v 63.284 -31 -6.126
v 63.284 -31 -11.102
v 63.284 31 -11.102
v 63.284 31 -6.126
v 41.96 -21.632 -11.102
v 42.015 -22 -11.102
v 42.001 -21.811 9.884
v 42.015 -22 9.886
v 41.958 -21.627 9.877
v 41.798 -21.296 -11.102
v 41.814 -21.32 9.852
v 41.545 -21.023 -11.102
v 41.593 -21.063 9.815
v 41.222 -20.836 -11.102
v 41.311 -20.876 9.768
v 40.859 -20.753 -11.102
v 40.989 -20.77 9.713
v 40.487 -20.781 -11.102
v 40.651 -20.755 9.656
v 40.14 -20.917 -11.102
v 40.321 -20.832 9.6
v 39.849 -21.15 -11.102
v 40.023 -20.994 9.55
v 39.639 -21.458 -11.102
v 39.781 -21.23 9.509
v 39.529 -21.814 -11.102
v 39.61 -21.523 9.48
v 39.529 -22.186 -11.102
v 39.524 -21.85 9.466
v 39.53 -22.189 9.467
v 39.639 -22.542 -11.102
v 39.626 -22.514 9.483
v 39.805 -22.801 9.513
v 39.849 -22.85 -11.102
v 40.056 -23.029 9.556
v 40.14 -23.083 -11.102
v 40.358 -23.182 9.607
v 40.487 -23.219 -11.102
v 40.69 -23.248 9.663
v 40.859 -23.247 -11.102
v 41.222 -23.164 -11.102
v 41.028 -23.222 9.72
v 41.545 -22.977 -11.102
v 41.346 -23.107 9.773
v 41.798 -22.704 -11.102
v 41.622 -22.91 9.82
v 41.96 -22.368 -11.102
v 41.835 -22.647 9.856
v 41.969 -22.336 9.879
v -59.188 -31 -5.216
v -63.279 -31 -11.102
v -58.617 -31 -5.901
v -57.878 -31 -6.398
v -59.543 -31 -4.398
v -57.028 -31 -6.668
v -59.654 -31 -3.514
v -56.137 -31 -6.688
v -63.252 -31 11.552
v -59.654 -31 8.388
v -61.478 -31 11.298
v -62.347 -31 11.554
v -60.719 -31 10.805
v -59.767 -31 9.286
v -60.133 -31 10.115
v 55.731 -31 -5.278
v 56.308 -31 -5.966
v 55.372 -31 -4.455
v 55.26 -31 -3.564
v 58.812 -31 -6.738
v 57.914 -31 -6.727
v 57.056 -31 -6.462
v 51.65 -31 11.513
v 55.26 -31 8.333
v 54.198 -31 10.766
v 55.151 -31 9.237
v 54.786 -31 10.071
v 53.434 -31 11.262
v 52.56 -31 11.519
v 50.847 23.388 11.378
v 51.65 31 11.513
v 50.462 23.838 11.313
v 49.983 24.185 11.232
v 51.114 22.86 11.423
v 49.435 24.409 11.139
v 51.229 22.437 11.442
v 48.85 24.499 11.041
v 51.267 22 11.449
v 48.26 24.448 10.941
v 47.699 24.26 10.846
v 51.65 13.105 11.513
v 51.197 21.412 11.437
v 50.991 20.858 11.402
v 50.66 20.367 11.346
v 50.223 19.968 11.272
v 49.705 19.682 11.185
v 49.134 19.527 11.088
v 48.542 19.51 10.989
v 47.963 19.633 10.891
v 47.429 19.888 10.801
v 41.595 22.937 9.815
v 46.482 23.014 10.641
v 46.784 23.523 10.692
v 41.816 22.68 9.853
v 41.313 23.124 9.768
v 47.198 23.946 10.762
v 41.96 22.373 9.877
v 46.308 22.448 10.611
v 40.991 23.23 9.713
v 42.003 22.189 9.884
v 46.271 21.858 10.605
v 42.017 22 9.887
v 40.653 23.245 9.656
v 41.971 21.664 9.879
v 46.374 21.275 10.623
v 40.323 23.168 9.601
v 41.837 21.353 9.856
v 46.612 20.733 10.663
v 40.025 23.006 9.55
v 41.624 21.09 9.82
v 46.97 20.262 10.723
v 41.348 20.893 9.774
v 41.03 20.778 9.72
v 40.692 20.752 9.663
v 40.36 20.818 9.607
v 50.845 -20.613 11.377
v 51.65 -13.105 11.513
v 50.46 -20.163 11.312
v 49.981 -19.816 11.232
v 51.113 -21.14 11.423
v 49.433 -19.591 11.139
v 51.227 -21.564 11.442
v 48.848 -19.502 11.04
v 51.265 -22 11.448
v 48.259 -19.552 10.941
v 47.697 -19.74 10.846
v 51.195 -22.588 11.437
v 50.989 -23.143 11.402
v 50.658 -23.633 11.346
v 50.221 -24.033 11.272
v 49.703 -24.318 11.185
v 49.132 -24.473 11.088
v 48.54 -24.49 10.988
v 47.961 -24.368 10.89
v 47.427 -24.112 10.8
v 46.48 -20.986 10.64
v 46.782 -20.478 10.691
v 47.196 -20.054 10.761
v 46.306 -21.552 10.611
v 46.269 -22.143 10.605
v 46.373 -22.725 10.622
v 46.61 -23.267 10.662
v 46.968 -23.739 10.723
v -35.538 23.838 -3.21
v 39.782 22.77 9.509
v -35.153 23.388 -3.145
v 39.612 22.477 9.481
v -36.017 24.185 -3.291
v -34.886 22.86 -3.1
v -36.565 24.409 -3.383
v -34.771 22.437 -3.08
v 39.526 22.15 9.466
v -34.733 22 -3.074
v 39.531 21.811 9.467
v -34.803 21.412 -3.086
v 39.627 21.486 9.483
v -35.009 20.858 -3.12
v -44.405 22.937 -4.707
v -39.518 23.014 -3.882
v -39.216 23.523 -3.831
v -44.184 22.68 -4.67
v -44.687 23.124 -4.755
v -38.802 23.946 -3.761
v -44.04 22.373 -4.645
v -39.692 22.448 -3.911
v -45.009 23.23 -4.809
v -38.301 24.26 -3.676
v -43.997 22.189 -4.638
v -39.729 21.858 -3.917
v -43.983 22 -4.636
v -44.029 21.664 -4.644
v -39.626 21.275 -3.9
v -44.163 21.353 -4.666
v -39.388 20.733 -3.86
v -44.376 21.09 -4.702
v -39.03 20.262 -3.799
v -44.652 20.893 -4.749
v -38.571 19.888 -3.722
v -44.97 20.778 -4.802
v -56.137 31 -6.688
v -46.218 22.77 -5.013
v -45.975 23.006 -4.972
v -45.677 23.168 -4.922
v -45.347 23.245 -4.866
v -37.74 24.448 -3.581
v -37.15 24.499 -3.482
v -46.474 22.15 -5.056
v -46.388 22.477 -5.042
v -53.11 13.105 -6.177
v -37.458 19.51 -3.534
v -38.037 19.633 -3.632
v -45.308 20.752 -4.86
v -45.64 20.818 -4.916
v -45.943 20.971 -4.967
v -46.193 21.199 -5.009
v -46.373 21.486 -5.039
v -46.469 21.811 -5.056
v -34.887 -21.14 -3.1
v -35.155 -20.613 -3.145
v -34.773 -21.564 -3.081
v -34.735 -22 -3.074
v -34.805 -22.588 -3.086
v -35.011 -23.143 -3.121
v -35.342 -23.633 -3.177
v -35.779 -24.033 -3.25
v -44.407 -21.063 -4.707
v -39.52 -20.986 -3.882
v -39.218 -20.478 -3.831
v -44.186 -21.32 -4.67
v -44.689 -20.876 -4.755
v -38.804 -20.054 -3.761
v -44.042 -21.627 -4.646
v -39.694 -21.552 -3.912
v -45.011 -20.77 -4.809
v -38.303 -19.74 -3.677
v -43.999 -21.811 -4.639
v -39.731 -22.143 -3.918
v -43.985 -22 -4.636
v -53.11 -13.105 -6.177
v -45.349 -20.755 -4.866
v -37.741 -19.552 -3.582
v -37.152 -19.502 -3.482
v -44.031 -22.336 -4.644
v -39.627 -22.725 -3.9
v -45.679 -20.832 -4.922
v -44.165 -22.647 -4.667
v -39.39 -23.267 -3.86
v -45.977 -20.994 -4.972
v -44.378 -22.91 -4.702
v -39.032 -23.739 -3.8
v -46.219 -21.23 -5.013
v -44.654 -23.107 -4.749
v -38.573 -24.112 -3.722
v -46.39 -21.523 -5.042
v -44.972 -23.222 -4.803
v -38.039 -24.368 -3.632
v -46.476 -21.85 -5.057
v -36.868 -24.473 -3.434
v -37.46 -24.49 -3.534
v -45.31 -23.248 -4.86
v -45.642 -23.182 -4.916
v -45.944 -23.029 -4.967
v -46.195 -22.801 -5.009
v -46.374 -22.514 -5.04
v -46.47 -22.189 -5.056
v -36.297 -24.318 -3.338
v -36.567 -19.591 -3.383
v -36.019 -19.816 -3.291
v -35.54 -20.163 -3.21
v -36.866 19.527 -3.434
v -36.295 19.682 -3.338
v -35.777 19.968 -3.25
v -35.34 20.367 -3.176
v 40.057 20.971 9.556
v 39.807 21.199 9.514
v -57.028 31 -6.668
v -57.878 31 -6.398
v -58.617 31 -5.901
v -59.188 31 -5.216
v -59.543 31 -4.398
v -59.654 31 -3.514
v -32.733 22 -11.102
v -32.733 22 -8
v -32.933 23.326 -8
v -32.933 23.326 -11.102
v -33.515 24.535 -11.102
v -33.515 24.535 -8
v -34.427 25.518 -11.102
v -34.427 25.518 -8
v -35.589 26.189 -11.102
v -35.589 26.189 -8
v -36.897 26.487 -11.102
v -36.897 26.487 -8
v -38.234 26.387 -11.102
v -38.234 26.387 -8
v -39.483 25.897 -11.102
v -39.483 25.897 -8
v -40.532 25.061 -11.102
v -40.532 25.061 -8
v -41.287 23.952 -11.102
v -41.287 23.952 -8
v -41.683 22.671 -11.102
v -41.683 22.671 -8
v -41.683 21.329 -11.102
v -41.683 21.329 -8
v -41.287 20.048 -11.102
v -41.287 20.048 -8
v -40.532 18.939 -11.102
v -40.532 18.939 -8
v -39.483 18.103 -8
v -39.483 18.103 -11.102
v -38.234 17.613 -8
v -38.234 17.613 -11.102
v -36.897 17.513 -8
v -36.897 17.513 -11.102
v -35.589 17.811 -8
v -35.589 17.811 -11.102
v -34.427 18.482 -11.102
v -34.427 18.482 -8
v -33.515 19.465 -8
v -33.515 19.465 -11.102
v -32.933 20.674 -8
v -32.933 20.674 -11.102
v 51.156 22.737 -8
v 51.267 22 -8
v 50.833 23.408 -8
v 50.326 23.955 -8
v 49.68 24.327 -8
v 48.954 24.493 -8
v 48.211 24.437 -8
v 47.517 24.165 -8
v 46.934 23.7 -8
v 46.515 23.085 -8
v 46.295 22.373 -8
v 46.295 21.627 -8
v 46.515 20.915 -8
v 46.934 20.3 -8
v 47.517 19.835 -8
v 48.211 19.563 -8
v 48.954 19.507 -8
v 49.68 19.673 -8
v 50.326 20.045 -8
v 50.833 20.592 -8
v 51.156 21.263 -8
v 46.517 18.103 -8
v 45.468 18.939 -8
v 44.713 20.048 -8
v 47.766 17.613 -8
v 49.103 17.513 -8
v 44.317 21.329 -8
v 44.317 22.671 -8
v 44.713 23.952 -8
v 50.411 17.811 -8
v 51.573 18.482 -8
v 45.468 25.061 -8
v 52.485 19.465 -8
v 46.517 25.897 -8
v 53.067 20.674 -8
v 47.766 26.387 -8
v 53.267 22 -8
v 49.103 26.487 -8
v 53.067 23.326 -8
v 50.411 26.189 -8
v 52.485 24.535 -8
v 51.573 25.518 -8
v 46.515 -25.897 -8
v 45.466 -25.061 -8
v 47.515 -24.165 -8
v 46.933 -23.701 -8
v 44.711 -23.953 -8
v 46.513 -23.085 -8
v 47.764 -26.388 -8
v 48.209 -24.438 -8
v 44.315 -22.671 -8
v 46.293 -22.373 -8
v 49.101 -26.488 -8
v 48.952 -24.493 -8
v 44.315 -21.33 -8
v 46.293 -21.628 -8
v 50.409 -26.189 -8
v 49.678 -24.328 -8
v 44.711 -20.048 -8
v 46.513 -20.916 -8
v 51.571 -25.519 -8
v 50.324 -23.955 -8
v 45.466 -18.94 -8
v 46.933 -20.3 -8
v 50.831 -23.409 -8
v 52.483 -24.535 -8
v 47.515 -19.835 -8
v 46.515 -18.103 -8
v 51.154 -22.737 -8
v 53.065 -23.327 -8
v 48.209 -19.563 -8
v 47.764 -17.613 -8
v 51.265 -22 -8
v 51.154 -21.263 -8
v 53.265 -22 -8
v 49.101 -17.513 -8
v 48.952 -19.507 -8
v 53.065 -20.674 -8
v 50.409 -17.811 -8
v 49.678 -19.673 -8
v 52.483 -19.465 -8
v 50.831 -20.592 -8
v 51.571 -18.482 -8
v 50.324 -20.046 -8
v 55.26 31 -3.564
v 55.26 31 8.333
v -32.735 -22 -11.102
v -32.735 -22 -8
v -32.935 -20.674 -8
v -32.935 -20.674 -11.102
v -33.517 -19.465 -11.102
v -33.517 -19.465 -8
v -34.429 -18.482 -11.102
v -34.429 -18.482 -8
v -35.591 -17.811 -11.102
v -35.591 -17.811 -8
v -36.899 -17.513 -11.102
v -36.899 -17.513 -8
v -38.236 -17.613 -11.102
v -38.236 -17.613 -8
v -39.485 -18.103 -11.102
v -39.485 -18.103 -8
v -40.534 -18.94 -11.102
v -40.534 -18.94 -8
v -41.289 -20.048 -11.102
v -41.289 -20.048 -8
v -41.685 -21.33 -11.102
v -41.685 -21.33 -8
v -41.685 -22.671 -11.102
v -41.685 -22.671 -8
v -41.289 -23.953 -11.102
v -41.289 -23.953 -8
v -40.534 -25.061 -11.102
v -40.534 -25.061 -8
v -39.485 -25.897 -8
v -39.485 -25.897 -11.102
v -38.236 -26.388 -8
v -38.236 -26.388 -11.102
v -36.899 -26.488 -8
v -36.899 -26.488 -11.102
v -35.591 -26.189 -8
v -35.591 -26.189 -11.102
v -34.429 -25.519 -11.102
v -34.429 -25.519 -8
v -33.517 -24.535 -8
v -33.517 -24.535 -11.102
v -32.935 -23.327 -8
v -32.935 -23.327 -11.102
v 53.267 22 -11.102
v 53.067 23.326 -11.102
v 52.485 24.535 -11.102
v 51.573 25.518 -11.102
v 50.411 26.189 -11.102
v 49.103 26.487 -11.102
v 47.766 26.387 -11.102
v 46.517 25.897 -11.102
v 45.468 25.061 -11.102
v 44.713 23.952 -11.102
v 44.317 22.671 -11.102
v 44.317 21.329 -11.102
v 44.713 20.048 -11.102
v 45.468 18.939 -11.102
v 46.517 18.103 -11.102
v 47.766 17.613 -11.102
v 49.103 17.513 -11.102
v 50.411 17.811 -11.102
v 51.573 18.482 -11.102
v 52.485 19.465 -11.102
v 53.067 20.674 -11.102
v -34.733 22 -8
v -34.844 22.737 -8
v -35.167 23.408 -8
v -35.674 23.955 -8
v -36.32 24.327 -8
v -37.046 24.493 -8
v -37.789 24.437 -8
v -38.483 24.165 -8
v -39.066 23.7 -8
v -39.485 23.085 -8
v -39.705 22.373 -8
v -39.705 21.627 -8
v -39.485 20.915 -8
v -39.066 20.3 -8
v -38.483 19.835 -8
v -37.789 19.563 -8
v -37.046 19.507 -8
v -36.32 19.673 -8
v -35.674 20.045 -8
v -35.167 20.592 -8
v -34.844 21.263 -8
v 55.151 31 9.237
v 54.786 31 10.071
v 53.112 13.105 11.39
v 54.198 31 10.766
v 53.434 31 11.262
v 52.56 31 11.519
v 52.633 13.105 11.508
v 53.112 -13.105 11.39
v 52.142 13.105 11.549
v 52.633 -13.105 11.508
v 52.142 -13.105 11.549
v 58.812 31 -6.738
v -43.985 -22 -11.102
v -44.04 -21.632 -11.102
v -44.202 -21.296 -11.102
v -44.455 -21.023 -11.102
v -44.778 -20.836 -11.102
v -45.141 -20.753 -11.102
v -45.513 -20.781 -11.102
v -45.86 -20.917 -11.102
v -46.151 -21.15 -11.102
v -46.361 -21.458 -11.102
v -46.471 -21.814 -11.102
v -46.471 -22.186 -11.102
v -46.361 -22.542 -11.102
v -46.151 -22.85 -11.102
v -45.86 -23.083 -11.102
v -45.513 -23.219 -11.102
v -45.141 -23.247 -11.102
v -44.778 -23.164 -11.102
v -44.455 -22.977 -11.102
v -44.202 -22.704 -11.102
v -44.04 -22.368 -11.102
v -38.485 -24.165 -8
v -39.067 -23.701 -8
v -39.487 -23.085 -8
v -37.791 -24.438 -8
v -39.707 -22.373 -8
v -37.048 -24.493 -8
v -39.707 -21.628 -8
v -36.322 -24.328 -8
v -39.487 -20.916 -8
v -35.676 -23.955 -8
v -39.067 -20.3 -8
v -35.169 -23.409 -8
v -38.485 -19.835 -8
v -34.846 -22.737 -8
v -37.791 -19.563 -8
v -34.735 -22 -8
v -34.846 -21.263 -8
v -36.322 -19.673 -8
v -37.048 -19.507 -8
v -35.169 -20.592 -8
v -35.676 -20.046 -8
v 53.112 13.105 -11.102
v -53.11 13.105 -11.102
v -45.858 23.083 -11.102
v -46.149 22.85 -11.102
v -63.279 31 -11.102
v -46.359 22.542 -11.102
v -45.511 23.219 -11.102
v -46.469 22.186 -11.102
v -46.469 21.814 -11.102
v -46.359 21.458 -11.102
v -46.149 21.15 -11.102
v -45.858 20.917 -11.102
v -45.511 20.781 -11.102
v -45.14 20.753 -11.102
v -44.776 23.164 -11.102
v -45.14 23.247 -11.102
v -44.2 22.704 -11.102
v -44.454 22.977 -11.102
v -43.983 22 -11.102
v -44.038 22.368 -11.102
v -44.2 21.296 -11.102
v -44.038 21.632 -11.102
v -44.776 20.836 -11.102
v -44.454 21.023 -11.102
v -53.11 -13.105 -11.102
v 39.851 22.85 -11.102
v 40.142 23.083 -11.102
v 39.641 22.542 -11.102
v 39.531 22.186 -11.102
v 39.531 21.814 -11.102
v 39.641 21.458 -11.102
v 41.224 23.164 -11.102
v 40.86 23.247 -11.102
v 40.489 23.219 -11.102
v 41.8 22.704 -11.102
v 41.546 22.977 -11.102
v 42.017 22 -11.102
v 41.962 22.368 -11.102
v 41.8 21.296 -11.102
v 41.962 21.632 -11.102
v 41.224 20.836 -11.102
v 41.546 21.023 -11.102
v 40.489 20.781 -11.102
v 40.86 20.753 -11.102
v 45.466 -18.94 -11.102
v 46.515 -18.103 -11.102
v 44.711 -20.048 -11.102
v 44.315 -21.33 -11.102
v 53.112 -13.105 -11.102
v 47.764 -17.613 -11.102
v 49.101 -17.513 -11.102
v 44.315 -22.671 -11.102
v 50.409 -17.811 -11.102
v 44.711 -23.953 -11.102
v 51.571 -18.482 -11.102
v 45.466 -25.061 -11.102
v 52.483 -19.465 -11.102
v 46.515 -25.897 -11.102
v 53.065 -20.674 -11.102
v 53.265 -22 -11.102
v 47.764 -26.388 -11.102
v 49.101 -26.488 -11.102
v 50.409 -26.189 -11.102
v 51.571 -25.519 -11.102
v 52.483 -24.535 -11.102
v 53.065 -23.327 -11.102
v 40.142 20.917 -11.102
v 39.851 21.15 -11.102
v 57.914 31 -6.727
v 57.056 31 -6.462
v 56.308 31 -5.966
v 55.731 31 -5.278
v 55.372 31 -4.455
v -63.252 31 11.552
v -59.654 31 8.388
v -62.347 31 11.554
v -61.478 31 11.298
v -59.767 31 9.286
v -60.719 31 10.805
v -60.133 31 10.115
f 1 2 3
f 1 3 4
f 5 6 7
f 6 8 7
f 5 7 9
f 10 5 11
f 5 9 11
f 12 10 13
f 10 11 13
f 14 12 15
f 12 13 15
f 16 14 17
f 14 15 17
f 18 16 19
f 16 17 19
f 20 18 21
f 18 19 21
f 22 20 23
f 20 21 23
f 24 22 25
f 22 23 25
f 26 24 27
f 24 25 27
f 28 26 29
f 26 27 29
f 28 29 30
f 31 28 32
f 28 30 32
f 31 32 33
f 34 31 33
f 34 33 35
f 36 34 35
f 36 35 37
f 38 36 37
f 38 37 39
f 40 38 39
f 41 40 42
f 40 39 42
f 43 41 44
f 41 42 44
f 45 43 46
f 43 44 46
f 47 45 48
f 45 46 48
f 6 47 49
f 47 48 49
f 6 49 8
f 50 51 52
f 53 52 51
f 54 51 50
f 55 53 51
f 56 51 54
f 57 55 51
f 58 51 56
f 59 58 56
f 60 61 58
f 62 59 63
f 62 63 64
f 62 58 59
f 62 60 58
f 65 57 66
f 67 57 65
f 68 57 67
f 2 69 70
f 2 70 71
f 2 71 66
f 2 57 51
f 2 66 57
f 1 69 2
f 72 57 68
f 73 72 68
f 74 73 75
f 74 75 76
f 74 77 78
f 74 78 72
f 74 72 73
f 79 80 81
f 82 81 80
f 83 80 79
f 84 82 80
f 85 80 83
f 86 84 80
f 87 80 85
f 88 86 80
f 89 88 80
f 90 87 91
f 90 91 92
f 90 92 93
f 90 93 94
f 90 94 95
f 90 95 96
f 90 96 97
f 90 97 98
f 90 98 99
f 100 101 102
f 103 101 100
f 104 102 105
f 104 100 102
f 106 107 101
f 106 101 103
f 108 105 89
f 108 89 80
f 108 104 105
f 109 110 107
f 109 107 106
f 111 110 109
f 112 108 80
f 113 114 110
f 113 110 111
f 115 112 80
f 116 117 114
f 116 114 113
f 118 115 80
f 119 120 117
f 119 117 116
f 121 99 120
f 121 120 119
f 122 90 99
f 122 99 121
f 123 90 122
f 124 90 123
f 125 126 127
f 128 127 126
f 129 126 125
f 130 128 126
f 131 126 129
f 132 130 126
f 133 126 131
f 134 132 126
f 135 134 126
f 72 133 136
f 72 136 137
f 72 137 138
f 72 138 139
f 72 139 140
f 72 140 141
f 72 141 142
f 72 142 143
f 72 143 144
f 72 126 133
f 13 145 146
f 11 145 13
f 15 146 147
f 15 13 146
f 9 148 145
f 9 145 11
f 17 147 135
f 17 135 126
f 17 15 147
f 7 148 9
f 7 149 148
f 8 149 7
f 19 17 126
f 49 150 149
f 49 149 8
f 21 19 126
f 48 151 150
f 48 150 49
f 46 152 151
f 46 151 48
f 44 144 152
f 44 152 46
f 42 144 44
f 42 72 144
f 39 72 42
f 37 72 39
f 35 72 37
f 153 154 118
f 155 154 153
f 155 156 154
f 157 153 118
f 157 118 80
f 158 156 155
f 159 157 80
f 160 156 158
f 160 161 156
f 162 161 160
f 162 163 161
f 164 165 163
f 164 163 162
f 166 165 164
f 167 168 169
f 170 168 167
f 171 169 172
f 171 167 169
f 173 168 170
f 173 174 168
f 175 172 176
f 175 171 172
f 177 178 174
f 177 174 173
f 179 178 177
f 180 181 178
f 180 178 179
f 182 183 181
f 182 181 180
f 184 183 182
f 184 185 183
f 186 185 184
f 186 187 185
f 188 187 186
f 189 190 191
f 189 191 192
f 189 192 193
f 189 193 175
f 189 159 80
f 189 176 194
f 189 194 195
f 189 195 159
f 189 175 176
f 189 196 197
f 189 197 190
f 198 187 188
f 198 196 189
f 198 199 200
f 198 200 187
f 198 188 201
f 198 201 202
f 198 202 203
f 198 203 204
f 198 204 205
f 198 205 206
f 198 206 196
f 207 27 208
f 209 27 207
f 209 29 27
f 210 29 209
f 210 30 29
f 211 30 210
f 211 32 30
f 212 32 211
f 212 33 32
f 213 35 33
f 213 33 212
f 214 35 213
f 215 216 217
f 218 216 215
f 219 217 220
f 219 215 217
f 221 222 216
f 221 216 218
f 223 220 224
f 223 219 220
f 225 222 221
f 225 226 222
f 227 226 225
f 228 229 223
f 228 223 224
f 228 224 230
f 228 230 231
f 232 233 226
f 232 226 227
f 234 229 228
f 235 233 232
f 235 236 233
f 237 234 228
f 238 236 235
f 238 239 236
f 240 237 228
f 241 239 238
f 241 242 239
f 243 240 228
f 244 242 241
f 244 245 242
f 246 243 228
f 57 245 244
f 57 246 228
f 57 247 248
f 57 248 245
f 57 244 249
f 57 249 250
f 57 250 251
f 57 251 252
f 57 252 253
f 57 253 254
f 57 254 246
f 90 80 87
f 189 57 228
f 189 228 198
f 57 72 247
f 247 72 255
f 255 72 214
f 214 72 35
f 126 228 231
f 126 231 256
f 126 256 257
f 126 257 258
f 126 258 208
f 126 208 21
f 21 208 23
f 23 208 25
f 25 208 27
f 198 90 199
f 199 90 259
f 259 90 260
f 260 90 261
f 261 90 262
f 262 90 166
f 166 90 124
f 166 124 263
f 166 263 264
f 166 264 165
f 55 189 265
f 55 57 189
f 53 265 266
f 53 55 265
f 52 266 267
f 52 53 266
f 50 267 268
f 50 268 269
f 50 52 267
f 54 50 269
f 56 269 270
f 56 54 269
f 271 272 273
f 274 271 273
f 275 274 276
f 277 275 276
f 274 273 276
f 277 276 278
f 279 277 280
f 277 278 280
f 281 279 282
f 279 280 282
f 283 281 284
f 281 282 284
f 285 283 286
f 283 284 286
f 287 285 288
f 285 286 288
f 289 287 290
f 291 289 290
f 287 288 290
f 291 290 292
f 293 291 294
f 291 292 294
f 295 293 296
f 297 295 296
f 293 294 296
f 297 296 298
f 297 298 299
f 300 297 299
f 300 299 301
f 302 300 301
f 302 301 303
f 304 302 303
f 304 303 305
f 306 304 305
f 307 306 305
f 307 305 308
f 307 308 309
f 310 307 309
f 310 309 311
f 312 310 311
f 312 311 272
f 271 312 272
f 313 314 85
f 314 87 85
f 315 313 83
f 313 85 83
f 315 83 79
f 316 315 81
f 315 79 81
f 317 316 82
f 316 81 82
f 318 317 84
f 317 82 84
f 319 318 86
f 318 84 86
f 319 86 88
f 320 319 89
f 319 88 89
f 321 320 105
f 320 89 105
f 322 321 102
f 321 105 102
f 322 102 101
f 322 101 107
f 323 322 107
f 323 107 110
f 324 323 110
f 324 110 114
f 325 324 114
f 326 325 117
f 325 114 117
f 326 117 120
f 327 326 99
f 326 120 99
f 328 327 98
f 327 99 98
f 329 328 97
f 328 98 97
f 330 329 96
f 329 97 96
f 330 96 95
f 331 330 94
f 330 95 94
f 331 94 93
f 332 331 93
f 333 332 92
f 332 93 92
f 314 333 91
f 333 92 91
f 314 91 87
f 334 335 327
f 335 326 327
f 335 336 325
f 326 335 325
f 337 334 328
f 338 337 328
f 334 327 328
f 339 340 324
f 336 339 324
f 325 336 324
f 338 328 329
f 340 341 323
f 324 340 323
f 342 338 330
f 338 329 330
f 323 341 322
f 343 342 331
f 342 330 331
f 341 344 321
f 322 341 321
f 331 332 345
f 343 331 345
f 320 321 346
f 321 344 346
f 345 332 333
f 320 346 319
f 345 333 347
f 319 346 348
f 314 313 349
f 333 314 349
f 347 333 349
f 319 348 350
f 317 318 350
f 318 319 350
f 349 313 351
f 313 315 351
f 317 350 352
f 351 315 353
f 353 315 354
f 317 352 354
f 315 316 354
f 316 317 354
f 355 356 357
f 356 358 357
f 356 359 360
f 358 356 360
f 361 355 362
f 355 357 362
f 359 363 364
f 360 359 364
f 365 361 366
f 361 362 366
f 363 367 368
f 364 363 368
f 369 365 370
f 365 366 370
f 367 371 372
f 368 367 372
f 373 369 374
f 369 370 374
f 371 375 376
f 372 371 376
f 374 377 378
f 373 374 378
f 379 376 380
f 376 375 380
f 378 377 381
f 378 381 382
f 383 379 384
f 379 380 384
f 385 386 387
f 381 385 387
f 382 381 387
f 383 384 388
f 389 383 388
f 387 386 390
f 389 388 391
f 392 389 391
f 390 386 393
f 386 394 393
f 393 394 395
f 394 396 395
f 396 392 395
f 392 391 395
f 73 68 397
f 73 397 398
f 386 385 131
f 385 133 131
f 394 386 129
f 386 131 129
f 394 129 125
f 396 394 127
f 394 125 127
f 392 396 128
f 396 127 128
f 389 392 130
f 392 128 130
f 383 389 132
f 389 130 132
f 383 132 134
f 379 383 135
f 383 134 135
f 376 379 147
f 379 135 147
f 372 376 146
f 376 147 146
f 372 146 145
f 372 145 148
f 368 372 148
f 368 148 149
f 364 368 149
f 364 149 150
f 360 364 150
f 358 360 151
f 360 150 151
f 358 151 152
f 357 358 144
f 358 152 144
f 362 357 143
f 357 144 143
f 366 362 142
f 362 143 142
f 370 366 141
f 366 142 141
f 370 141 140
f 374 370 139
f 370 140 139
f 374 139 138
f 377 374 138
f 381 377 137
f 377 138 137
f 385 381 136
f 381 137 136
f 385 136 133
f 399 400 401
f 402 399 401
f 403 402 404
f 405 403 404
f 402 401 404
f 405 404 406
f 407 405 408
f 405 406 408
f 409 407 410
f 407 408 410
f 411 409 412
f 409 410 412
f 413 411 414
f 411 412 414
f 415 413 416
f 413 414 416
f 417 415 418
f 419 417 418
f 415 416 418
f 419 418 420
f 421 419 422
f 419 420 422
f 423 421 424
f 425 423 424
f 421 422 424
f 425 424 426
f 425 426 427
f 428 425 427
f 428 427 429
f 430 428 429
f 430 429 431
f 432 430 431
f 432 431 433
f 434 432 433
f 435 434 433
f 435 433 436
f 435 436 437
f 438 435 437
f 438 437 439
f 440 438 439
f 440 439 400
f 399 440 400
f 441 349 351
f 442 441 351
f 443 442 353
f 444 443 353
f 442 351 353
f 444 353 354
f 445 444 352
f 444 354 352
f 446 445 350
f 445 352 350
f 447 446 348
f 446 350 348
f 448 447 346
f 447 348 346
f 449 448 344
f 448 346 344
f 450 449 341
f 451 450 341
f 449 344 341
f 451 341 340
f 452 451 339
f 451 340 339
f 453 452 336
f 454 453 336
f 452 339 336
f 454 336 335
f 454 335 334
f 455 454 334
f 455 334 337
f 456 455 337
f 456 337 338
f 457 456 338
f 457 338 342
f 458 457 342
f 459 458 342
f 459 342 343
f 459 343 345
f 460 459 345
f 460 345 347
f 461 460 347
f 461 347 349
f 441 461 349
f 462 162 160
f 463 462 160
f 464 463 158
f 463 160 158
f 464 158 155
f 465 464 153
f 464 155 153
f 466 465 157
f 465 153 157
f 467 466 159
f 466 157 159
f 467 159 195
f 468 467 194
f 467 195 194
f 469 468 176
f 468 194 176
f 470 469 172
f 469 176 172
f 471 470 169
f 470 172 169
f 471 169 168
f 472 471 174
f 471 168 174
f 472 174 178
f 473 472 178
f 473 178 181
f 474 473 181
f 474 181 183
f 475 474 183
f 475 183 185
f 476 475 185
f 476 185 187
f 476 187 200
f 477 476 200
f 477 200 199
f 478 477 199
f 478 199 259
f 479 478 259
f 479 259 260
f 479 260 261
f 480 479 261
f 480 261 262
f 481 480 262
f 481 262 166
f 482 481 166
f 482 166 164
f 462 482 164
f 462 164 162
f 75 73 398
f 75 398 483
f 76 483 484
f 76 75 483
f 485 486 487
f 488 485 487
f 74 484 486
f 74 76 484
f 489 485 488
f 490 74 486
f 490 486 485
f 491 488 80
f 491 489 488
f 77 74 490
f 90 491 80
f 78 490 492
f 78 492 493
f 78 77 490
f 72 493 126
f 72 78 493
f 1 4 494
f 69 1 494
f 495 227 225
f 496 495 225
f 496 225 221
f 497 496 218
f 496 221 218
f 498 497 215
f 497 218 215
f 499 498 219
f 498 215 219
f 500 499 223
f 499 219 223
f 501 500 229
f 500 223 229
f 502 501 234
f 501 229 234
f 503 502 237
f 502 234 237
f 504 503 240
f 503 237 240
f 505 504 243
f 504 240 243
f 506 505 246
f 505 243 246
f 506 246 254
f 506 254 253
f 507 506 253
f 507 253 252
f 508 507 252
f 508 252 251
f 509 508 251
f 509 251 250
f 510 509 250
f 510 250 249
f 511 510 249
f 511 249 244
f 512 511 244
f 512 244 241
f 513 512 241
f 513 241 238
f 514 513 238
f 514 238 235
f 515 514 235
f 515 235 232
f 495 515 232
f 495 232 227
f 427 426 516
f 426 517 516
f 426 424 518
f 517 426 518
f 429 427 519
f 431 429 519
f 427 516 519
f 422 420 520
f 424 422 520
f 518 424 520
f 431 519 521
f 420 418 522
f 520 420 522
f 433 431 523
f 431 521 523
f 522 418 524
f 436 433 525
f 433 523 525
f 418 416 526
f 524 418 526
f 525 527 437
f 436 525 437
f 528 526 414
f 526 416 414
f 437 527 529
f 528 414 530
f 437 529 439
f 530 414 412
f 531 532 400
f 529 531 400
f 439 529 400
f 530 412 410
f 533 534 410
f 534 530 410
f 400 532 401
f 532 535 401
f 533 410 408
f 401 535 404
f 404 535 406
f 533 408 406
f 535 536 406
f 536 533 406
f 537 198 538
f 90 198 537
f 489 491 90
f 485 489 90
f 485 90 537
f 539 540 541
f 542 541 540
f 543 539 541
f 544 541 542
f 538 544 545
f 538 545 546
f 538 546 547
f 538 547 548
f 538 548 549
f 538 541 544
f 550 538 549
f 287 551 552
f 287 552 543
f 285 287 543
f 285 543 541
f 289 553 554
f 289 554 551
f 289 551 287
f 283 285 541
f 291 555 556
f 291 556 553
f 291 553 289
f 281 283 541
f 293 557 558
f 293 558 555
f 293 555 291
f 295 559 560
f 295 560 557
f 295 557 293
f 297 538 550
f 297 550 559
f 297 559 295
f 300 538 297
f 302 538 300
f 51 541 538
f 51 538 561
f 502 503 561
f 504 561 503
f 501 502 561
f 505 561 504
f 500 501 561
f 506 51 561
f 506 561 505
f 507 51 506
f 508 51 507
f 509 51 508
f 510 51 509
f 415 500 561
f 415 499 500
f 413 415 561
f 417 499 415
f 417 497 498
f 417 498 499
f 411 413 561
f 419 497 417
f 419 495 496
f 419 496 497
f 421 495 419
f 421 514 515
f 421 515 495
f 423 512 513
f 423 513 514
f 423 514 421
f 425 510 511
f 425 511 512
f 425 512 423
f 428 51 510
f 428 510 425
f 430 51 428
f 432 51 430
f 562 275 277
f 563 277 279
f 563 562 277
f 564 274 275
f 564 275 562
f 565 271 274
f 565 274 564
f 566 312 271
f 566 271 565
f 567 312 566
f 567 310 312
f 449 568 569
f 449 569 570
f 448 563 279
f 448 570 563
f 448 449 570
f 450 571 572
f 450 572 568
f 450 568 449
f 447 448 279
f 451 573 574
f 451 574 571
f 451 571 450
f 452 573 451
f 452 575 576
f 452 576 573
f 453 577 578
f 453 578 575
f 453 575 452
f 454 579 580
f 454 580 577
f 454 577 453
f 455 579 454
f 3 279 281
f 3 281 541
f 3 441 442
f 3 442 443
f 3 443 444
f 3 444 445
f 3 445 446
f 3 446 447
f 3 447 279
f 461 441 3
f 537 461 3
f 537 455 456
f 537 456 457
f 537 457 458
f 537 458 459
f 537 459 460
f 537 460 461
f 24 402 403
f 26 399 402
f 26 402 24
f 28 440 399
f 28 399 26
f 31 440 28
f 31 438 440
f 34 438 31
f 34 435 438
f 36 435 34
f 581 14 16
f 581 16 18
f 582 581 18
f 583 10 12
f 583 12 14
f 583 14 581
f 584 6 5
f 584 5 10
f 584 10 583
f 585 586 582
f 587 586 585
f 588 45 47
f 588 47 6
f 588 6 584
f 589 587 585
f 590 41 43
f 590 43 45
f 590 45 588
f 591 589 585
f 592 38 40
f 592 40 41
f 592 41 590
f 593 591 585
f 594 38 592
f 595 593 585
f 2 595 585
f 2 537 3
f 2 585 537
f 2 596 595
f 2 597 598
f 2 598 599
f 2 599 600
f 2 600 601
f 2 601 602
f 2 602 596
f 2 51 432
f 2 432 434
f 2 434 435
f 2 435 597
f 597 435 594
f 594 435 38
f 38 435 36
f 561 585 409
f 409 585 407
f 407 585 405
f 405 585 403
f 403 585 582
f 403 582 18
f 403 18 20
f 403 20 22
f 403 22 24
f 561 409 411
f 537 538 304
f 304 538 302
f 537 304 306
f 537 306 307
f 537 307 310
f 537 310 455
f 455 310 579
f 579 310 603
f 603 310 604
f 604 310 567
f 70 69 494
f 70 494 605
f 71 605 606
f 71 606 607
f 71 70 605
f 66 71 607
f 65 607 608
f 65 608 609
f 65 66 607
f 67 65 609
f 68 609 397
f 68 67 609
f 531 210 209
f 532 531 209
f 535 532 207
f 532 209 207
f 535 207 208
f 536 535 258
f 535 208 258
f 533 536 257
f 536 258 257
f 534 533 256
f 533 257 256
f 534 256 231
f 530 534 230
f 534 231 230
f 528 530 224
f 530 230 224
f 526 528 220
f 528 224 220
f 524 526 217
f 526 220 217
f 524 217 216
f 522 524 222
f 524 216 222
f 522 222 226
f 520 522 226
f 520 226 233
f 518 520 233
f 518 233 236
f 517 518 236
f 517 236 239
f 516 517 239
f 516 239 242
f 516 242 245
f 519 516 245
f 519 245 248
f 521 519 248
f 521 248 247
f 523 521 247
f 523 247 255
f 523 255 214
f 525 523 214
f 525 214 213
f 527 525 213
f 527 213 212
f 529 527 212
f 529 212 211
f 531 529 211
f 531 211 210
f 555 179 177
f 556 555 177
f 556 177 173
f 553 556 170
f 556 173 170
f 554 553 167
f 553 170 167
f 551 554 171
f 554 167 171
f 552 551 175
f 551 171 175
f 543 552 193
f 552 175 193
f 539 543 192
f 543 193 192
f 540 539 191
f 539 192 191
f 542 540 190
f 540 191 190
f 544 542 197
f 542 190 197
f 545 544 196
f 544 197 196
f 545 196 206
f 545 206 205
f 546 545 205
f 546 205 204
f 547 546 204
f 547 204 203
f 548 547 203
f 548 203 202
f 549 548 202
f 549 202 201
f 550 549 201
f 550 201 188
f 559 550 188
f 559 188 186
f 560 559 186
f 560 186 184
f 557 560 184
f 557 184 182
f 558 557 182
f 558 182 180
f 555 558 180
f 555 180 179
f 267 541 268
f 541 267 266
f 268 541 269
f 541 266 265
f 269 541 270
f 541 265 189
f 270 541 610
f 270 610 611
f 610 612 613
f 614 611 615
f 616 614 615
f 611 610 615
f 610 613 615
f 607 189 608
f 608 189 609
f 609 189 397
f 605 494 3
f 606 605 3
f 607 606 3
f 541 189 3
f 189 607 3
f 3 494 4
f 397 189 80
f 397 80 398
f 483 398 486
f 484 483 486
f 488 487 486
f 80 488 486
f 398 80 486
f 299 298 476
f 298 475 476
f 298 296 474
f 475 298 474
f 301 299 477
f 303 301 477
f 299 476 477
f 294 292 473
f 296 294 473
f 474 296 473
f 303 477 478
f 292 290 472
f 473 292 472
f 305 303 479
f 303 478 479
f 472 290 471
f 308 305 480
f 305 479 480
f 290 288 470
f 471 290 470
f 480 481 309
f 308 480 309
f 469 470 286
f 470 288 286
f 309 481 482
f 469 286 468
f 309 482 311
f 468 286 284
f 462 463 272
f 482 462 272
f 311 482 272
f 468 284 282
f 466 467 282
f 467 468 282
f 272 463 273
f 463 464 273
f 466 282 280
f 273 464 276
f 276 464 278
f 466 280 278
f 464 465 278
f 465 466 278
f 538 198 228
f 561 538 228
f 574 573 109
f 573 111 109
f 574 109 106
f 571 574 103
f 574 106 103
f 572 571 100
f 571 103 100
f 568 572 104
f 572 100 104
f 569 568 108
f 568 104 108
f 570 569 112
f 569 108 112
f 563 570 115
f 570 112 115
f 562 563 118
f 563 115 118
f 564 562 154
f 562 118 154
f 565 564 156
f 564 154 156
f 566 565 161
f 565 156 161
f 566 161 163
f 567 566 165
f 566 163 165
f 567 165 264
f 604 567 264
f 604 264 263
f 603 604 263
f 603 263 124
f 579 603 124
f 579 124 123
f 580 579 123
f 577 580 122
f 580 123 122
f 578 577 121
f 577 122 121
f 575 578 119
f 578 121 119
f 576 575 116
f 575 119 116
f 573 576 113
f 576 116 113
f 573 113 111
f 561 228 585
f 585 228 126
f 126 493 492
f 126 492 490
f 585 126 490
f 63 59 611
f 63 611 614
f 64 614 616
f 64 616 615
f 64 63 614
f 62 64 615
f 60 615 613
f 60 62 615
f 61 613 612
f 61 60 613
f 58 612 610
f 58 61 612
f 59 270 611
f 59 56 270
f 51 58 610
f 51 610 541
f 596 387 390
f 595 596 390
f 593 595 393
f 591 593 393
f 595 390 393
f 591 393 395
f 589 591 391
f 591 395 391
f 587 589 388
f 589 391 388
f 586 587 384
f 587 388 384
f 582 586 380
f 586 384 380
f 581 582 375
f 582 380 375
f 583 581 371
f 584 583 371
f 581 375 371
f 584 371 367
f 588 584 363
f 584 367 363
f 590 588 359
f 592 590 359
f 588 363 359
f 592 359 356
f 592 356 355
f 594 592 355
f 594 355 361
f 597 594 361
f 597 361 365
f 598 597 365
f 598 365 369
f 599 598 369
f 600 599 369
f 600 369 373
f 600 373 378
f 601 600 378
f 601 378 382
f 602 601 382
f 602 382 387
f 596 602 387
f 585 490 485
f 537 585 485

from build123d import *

# Parameters (mm, degrees)
F1_DEPTH = 31
F3_W     = 106.2213294208
F3_H     = 13.1045691669
F4_DEPTH = 25
F5_R     = 1.25
F5_R_2   = 2.5
F6_DEPTH = 15
F7_START = -8
F5_R_3   = 4.5
F7_DEPTH = 4


with BuildPart() as f1:
    # F0 (on Front) → F1 (new body)
    with BuildSketch(Plane.XZ):
        with BuildLine():
            Line((-59.654000323, -3.5138892937), (-59.654000323, 8.3879307063))
            ThreePointArc((-59.654000323, 8.3879307063), (-60.7190612433, 10.8045648955), (-63.2520458808, 11.5518696492))
            Line((-63.2520458808, 11.5518696492), (-63.2789134979, -11.1016744181))
            Line((-63.2789134979, -11.1016744181), (63.284156729, -11.1016744181))
            Line((63.284156729, -11.1016744181), (63.284156729, -6.1260935991))
            Line((63.284156729, -6.1260935991), (58.8121598262, -6.7381653853))
            ThreePointArc((58.8121598262, -6.7381653853), (56.307949738, -5.9657950954), (55.2598693261, -3.5638892937))
            Line((55.2598693261, -3.5638892937), (55.2598693261, 8.3326508177))
            ThreePointArc((55.2598693261, 8.3326508177), (54.1975321527, 10.7659194445), (51.649858136, 11.5133909047))
            Line((51.649858136, 11.5133909047), (-56.1369696956, -6.6881653853))
            ThreePointArc((-56.1369696956, -6.6881653853), (-58.6174350193, -5.900932648), (-59.654000323, -3.5138892937))
        make_face()
    extrude(amount=F1_DEPTH)

    # F2: F1 across plane


with BuildPart() as f1_1:
    add(f1.part)
    add(f1.part.mirror(Plane.XZ))

    # F3 (on Top) → F4 (cut, symmetric)
    with BuildSketch(Plane.XY):
        with Locations((0.0008549541, -6.5522845834)):
            Rectangle(F3_W, F3_H)
        with Locations((0.0008549541, 6.5522845834)):
            Rectangle(F3_W, F3_H)
    extrude(amount=F4_DEPTH, both=True, mode=Mode.SUBTRACT)

    # F5 (on Top) → F6 (cut, symmetric)
    with BuildSketch(Plane.XY):
        with Locations((40.7651439339, -22)):
            Circle(F5_R)
        with Locations((-45.2348560661, -21.9999999583)):
            Circle(F5_R)
        with Locations((-45.23294, 22)):
            Circle(F5_R)
        with Locations((40.76706, 22)):
            Circle(F5_R)
        with Locations((-37.23294, 22)):
            Circle(F5_R_2)
        with Locations((-37.2348560737, -22.0003483339)):
            Circle(F5_R_2)
        with Locations((48.7651439263, -22.0003483756)):
            Circle(F5_R_2)
        with Locations((48.76706, 22)):
            Circle(F5_R_2)
    extrude(amount=F6_DEPTH, both=True, mode=Mode.SUBTRACT)

    # F5 (on Top) → F7 (cut)
    with BuildSketch(Plane.XY.offset(F7_START)):
        with Locations((-37.23294, 22)):
            Circle(F5_R_3)
        with Locations((-37.23294, 22)):
            Circle(F5_R_2, mode=Mode.SUBTRACT)
        with Locations((-37.2348560737, -22.0003483339)):
            Circle(F5_R_3)
        with Locations((-37.2348560737, -22.0003483339)):
            Circle(F5_R_2, mode=Mode.SUBTRACT)
        with Locations((48.76706, 22)):
            Circle(F5_R_3)
        with Locations((48.76706, 22)):
            Circle(F5_R_2, mode=Mode.SUBTRACT)
        with Locations((48.7651439263, -22.0003483756)):
            Circle(F5_R_3)
        with Locations((48.7651439263, -22.0003483756)):
            Circle(F5_R_2, mode=Mode.SUBTRACT)
    extrude(amount=-F7_DEPTH, mode=Mode.SUBTRACT)


solid = f1_1.part
